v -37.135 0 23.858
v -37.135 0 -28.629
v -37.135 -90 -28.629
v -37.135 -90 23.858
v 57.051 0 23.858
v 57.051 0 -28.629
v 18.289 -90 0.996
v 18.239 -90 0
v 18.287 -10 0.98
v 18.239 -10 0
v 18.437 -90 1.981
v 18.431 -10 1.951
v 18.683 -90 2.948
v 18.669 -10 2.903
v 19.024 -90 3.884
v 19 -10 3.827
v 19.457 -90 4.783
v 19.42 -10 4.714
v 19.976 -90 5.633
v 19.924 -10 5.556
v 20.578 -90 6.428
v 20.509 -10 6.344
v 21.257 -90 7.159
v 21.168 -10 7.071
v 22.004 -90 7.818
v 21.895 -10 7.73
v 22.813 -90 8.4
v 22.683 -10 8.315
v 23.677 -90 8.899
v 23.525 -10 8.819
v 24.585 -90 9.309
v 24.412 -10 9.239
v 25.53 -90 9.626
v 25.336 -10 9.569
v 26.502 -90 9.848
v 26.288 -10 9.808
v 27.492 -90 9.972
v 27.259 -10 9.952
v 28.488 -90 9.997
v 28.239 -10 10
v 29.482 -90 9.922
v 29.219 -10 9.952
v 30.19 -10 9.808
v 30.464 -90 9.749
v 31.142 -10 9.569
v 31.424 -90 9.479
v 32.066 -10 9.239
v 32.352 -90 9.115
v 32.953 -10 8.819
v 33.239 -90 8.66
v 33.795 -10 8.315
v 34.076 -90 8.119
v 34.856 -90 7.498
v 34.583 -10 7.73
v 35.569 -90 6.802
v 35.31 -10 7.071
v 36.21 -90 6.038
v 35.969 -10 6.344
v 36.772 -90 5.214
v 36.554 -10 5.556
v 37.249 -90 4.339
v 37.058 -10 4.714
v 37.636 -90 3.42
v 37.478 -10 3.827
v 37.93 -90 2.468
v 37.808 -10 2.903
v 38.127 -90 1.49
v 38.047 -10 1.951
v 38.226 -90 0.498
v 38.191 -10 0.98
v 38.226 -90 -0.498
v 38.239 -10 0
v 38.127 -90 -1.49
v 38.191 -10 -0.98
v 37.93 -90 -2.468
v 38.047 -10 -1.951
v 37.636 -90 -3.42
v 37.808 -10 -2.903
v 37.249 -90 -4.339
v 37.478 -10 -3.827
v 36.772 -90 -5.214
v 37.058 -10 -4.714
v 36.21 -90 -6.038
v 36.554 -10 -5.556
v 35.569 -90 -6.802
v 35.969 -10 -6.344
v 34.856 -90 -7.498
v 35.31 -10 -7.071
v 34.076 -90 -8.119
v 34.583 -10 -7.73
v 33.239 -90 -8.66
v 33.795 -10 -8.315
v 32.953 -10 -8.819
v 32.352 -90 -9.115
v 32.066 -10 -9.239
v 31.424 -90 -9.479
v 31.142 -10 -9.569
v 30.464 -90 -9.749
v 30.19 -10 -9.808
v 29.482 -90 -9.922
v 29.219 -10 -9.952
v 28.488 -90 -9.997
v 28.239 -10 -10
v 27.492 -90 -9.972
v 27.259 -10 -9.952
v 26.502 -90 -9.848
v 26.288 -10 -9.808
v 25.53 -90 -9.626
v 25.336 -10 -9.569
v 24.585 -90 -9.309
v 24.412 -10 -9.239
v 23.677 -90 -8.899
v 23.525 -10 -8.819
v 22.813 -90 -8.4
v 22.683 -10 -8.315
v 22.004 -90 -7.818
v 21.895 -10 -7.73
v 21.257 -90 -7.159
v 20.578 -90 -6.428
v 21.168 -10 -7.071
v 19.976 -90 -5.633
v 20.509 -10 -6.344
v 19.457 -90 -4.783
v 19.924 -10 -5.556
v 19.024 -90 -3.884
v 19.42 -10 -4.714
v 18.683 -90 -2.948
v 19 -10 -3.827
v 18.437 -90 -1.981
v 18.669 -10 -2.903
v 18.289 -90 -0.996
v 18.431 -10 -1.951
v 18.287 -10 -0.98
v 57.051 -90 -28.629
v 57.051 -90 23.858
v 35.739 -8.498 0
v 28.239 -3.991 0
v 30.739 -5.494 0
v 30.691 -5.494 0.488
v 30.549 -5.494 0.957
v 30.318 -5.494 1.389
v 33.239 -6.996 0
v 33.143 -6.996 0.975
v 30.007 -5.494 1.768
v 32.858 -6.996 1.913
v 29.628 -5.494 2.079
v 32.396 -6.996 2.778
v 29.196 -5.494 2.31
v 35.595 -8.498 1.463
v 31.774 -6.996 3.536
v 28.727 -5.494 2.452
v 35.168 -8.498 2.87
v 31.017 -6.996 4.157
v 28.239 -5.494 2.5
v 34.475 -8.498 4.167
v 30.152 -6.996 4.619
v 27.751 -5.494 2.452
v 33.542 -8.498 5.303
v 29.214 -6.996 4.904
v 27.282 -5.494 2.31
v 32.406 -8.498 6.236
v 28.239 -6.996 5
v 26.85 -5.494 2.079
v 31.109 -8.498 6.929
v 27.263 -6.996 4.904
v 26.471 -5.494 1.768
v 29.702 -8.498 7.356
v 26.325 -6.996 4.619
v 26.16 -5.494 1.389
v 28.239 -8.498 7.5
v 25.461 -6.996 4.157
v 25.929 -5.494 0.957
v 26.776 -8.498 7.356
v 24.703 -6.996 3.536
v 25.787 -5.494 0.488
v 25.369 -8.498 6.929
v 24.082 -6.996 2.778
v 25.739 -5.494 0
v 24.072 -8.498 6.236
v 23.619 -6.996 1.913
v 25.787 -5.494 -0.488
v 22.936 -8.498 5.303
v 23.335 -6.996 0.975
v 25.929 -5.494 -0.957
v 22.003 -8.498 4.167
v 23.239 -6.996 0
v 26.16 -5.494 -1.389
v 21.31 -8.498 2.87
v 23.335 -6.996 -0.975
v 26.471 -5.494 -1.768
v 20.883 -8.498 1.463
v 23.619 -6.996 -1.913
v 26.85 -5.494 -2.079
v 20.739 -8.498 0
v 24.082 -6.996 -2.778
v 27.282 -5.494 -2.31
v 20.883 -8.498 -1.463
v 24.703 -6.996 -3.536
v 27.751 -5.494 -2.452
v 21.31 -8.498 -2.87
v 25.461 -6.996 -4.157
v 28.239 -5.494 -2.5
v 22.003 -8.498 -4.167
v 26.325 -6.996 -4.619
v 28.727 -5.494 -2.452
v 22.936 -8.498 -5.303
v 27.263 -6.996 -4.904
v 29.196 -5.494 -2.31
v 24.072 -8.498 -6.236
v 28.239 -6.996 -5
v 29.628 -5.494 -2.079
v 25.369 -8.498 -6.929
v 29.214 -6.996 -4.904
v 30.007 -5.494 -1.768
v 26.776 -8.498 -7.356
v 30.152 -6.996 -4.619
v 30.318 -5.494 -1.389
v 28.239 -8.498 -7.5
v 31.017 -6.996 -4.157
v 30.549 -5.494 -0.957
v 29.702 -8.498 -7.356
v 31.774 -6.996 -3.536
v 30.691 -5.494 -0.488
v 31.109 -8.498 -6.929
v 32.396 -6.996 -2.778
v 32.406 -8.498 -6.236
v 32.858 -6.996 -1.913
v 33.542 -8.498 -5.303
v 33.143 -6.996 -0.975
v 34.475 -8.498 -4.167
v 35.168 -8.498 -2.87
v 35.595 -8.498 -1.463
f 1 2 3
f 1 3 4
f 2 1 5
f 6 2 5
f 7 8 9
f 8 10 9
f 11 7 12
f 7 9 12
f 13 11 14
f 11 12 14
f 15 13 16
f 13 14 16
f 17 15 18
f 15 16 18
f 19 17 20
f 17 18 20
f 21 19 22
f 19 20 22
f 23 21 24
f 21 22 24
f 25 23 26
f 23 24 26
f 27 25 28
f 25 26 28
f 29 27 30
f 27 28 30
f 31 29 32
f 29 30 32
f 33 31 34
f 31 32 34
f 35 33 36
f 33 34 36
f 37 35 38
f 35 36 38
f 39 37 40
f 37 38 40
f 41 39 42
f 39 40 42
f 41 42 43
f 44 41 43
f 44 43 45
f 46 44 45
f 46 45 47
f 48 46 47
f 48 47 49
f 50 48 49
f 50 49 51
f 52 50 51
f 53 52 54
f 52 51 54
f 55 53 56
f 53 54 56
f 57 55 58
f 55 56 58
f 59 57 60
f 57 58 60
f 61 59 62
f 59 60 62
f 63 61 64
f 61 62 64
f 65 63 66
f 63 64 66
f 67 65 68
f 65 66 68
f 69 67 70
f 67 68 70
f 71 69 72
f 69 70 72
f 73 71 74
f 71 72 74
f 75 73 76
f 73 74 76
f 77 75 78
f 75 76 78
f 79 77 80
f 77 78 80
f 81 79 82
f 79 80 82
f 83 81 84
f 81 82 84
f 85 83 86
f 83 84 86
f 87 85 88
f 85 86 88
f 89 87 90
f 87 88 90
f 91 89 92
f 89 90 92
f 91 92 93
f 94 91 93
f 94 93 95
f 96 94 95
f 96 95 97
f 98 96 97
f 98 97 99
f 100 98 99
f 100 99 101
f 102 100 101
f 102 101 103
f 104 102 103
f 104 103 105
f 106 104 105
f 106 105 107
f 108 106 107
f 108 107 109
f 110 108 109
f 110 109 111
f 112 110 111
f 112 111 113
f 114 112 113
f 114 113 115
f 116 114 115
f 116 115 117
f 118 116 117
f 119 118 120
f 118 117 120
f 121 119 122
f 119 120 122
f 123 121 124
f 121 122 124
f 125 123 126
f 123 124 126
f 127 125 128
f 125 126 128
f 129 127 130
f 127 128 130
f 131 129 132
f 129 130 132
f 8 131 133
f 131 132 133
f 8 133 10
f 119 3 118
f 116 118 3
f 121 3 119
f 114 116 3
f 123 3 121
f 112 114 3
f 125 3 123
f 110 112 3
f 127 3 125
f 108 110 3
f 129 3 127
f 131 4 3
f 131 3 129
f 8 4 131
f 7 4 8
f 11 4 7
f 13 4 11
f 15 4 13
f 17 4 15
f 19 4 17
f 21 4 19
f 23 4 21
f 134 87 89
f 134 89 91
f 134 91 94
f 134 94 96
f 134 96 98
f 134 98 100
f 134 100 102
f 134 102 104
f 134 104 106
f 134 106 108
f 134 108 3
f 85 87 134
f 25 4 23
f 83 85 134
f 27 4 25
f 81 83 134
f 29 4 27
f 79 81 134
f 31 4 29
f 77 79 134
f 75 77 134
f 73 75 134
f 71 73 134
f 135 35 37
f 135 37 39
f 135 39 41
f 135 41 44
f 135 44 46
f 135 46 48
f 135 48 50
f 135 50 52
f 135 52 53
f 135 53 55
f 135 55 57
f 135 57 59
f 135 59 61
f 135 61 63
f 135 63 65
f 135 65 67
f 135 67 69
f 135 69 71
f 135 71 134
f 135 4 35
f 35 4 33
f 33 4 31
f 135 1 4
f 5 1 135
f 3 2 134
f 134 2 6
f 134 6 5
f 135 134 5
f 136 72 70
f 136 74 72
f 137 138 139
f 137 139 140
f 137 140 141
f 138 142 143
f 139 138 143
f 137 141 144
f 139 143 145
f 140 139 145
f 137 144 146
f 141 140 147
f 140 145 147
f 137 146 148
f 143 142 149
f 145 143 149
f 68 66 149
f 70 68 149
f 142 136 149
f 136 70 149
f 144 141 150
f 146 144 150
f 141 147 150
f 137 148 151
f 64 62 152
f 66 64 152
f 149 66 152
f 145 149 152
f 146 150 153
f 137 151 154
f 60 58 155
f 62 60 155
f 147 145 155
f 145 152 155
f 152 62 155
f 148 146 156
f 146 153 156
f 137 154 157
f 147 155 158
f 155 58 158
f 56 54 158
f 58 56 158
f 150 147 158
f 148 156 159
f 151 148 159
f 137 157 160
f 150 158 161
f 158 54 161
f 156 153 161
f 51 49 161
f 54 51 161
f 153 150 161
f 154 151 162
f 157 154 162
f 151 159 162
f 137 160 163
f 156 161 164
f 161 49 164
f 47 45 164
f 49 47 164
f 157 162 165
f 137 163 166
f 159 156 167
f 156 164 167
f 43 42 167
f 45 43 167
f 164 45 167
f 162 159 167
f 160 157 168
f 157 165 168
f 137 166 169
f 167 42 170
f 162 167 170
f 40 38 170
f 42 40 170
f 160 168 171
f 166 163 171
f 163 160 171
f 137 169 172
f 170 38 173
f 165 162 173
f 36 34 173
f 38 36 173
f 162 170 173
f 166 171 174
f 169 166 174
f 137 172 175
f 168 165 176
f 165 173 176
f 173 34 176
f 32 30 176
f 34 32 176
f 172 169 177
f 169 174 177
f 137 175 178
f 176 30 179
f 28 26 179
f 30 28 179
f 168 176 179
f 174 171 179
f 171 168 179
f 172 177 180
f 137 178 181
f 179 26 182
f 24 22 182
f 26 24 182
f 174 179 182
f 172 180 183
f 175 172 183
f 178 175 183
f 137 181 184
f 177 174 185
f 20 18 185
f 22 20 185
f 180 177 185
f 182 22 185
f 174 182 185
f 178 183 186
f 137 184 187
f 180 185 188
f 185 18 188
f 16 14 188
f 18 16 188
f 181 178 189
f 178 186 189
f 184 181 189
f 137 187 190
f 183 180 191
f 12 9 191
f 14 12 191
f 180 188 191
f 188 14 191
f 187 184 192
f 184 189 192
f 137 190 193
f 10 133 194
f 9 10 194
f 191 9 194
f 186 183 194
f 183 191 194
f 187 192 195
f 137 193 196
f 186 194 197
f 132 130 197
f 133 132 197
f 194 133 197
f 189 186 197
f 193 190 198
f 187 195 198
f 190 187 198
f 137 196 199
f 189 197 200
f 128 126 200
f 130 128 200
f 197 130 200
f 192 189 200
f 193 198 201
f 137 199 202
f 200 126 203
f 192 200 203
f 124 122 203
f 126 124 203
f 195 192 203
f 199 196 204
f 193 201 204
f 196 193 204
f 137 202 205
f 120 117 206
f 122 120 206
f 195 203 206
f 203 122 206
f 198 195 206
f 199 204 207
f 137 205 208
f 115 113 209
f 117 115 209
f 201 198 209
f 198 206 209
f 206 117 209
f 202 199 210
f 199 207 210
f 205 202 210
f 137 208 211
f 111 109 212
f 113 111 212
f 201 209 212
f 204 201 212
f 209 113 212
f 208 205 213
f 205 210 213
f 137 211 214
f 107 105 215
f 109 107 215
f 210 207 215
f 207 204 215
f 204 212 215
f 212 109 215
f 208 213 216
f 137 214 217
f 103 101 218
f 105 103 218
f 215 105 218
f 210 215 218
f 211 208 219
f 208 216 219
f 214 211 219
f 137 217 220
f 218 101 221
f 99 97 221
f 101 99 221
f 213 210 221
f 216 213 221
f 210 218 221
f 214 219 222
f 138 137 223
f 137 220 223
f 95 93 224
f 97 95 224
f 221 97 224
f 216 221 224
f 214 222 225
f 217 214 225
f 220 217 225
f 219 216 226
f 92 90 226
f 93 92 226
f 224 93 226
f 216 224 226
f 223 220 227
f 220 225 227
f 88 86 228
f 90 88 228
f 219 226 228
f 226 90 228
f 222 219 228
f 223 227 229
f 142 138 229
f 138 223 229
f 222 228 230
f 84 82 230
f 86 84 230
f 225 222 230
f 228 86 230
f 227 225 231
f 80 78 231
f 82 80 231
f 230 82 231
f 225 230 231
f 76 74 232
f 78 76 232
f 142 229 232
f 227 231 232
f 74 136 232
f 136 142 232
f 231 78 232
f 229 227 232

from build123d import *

# Parameters (mm, degrees)
F0_W     = 94.1855311394
F0_H     = 52.4866655469
F1_DEPTH = 90
F4_D     = 20
F4_DEPTH = 80
F4_TIP   = 6.0086061903
F5_R     = 9.112196694
F7_DEPTH = 80


# Not quite as in the source:
# - the program builds the solid bodies; features that only make, move or delete a surface that nothing else refers to are left out


with BuildPart() as f1:
    # F0 (on Front) → F1 (new body)
    with BuildSketch(Plane.XZ):
        with Locations((9.957909584, -2.3857913911)):
            Rectangle(F0_W, F0_H)
    extrude(amount=F1_DEPTH)

    # F4
    with Locations(Plane.XZ.offset(90)):
        with Locations((28.2388776541, 0)):
            Hole(F4_D / 2, depth=F4_DEPTH)
            with Locations((0, 0, -(F4_DEPTH + F4_TIP / 2))):  # 118° drill point
                Cone(0, F4_D / 2, F4_TIP, mode=Mode.SUBTRACT)

    # F5 (on face) → F7 (cut)
    with BuildSketch(Plane.XZ.offset(90)):
        with Locations((-17.2343160957, 0)):
            Circle(F5_R)
    extrude(amount=F7_DEPTH, mode=Mode.SUBTRACT)


solid = f1.part
